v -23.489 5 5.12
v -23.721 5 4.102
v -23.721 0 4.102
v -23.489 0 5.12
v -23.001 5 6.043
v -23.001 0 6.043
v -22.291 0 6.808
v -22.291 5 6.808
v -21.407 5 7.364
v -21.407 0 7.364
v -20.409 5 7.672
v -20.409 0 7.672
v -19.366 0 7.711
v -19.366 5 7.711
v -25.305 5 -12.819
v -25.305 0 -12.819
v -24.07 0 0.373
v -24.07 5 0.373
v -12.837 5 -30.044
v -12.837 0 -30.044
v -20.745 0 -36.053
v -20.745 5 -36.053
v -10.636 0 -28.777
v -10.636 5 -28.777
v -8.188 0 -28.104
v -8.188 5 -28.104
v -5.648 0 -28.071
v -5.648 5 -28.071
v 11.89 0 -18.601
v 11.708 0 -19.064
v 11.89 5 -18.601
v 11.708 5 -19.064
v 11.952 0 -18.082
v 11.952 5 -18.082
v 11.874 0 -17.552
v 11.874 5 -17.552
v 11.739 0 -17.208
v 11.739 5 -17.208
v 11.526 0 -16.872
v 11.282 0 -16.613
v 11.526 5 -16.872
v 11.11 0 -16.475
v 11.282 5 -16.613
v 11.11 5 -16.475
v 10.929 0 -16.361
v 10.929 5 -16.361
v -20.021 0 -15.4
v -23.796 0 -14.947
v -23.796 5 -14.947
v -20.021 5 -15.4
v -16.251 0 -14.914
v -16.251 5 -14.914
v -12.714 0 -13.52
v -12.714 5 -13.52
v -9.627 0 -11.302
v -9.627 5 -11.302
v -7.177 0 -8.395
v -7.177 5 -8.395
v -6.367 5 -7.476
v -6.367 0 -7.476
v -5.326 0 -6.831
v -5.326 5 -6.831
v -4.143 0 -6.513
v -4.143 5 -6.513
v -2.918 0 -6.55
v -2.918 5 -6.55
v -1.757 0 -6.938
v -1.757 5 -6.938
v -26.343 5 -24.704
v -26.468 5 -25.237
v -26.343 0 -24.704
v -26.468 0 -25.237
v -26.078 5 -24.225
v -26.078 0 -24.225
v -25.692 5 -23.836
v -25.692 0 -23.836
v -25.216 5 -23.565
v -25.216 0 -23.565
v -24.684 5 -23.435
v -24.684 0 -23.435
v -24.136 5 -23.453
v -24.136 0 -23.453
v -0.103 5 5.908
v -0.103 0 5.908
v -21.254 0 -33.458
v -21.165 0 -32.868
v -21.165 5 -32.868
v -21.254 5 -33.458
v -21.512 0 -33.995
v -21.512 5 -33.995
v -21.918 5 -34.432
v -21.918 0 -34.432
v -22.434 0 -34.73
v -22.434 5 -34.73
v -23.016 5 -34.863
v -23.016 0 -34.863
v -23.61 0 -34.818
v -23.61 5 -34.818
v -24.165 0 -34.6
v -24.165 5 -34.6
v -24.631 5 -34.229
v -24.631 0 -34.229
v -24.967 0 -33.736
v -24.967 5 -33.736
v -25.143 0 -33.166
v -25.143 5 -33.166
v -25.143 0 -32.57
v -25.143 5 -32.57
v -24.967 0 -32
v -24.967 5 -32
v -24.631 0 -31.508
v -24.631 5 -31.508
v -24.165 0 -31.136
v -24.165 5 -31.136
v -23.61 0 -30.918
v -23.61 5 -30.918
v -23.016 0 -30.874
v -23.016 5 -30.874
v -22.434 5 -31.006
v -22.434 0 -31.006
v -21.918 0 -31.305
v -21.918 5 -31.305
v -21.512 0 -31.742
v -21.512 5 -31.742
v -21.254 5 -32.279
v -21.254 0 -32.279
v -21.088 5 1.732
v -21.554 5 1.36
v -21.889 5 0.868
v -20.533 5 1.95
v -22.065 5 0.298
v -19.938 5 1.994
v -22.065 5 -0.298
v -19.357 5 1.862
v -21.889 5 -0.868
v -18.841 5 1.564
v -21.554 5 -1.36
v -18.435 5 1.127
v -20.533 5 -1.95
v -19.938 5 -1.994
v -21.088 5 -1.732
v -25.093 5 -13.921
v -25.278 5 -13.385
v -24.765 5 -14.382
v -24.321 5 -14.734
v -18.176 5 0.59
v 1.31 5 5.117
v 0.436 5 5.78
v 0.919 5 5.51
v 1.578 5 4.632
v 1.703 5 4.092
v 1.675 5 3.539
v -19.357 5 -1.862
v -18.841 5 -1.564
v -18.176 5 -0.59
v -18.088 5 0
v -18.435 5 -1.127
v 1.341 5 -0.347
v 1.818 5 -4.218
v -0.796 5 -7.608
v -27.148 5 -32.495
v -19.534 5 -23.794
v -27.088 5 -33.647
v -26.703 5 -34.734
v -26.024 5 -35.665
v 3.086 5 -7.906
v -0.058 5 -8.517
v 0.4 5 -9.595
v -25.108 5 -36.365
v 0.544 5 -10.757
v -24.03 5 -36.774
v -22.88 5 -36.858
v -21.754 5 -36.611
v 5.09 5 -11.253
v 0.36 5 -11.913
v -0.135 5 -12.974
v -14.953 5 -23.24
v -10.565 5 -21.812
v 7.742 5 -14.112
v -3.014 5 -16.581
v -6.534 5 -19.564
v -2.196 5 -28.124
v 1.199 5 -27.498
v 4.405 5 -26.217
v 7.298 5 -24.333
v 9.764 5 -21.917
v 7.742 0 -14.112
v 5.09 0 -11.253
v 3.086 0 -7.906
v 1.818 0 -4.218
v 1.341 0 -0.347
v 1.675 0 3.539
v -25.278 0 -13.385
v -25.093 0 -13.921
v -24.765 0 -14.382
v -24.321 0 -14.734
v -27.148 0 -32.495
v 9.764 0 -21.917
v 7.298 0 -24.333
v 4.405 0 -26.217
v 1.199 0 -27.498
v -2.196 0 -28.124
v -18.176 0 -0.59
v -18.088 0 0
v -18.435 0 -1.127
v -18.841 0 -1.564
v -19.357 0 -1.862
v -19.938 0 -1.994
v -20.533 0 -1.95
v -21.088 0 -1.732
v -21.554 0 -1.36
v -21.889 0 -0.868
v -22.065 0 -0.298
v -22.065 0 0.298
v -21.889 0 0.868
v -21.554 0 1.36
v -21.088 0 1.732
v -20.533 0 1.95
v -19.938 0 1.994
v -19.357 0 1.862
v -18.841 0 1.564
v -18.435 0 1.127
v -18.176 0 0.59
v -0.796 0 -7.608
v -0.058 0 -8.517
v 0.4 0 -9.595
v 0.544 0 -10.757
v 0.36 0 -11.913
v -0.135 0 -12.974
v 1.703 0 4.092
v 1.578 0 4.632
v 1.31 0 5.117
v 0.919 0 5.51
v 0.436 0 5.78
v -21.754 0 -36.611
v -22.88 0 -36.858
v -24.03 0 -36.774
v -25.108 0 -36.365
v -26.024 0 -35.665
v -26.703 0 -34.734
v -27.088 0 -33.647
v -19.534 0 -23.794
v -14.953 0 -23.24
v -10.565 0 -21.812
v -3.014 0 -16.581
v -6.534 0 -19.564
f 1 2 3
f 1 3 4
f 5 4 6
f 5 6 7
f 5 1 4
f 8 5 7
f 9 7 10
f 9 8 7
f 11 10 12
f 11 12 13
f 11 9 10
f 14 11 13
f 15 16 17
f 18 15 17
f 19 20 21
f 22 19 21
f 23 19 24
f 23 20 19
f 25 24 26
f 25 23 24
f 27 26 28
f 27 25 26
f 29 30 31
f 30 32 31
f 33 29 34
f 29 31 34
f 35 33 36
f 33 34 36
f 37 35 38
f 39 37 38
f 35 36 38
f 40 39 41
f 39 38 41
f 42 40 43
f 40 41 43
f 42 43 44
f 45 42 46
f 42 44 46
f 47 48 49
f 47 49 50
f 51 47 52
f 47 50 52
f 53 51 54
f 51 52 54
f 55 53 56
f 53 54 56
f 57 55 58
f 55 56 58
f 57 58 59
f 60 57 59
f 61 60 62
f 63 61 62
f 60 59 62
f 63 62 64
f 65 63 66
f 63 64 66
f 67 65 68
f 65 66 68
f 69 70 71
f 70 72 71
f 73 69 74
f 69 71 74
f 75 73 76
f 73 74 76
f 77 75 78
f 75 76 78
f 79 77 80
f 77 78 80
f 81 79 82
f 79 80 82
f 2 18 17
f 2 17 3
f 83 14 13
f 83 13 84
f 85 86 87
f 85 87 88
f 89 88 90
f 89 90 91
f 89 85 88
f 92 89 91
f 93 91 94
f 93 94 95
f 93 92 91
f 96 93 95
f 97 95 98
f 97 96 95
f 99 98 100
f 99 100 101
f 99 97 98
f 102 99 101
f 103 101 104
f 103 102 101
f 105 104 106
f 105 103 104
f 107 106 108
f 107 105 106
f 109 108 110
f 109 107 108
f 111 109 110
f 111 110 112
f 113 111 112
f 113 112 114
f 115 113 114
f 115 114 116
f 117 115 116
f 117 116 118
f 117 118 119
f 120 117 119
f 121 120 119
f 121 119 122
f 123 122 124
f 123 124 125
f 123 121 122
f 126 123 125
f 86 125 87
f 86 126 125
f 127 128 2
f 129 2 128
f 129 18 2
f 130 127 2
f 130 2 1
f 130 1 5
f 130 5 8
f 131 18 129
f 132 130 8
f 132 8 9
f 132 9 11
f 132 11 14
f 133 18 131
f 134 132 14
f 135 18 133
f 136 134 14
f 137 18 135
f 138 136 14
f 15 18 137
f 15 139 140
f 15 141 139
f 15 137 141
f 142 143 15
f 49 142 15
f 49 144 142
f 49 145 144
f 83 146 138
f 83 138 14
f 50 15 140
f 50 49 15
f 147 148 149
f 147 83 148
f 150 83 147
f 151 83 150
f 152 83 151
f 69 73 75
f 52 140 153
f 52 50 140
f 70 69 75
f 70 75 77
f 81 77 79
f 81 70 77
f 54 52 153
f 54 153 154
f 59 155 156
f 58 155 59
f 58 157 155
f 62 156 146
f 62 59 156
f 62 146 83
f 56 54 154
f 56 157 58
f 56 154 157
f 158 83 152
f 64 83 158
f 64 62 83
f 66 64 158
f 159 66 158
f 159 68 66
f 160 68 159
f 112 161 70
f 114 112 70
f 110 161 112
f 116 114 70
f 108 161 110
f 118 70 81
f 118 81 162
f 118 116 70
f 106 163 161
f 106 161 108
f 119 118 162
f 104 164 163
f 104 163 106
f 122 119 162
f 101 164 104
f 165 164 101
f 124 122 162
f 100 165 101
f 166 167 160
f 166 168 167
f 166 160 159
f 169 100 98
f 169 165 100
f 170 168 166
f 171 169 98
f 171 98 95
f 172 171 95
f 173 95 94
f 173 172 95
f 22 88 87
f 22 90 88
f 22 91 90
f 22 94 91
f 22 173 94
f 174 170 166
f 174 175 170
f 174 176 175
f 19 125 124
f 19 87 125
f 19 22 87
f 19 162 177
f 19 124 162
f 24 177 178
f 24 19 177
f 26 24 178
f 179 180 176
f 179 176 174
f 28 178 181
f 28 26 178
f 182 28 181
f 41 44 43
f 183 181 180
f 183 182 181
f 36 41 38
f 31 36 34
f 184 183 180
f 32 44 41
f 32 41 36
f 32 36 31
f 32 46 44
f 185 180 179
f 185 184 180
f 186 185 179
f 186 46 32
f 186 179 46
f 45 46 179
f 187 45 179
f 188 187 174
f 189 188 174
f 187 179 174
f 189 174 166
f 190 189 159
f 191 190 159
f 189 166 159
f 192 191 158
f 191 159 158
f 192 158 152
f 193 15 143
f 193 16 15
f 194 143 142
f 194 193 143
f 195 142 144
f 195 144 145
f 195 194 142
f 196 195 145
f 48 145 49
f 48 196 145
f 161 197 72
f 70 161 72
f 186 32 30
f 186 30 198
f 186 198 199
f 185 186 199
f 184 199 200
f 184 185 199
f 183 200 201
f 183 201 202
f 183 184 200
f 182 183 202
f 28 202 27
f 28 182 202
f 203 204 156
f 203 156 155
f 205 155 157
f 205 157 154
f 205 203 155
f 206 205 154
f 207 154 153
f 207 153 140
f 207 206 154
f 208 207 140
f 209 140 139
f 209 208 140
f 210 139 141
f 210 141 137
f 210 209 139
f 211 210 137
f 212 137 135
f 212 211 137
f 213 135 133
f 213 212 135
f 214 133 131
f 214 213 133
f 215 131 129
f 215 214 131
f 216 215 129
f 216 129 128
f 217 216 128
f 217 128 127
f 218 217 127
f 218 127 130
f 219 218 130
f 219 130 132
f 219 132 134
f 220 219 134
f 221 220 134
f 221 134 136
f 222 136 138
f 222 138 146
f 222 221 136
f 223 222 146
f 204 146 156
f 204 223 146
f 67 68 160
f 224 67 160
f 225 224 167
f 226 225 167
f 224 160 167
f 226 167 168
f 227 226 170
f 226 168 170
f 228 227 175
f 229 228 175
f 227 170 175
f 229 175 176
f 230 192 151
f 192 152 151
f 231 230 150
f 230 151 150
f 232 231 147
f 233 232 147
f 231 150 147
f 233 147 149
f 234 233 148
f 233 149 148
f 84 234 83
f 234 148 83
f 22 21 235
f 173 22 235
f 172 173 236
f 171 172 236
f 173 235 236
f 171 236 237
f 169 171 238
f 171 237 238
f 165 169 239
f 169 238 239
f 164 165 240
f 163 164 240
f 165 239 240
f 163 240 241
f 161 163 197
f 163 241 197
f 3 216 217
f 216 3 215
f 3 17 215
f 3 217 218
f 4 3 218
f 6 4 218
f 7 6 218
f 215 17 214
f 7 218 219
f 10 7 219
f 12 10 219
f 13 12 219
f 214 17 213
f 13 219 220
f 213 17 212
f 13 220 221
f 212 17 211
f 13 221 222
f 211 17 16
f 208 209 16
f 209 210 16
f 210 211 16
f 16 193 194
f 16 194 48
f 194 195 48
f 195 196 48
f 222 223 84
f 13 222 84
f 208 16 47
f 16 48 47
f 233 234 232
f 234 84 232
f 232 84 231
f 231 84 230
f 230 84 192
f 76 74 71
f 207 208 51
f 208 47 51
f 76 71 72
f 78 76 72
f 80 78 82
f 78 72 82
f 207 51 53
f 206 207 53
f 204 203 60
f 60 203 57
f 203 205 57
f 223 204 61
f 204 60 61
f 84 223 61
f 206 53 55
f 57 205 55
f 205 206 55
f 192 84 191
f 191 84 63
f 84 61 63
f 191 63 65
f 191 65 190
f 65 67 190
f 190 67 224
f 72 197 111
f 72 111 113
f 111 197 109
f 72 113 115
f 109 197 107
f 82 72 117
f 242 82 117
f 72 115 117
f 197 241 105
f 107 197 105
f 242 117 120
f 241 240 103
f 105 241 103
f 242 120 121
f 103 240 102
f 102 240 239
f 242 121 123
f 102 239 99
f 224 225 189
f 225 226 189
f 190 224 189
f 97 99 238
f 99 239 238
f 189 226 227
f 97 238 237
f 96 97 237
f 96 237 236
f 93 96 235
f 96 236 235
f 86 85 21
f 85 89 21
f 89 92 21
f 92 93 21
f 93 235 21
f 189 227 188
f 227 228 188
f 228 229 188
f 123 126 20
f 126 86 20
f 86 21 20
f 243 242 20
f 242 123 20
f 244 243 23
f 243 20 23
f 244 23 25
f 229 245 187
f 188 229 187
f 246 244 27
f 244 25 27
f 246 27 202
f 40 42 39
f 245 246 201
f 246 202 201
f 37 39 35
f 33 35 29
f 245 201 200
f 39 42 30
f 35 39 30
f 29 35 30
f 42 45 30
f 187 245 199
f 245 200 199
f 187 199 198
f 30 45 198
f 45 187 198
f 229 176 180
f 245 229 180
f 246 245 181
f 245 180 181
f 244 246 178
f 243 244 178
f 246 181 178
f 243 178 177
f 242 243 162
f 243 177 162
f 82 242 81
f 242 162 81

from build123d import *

# Parameters (mm, degrees)
SKETCH_1_R          = 2
EXTRUDE_1_DEPTH     = 5
EXTRUDE_2_DEPTH     = 5
CUT_EXTRUDE_1_DEPTH = 6
EXTRUDE_3_DEPTH     = 5
FILLET_1_R          = 10
FILLET_2_R          = 2
SKETCH_6_R          = 18.75
CUT_EXTRUDE_2_DEPTH = 6
FILLET_3_R          = 2


with BuildPart() as part:
    # 草图1 → 凸台-拉伸1 (new body)
    with BuildSketch(Plane(origin=(0, 0, 0), x_dir=(1, 0, 0), z_dir=(0, 1, 0))):
        with BuildLine():
            ThreePointArc((-20.0875, 4), (-23.044826598, 2.693365811), (-24.070081176, -0.372890305))
            ThreePointArc((-24.070081176, -0.372890305), (-22.780865811, -2.957326598), (-20.0875, -4))
            ThreePointArc((-20.0875, -4), (-17.130173402, -2.693365811), (-16.104918824, 0.372890305))
            Line((-16.104918824, 0.372890305), (-16.444526225, 4))
            Line((-16.444526225, 4), (-20.0875, 4))
        make_face()
        with Locations((-20.0875, 0)):
            Circle(SKETCH_1_R, mode=Mode.SUBTRACT)
        with BuildLine():
            Line((-27.14754486, 32.495352138), (-24.070081176, -0.372890305))
            ThreePointArc((-24.070081176, -0.372890305), (-23.044826598, 2.693365811), (-20.0875, 4))
            Line((-20.0875, 4), (-16.444526225, 4))
            Line((-16.444526225, 4), (-18.333300994, 24.172685504))
            Line((-18.333300994, 24.172685504), (-25.585127327, 29.683464909))
            ThreePointArc((-25.585127327, 29.683464909), (-26.661456606, 30.925425609), (-27.14754486, 32.495352138))
        make_face()
        with BuildLine():
            ThreePointArc((-20.74480004, 36.053019976), (-25.107780517, 36.364735365), (-27.14754486, 32.495352138))
            ThreePointArc((-27.14754486, 32.495352138), (-26.661456606, 30.925425609), (-25.585127327, 29.683464909))
            Line((-25.585127327, 29.683464909), (-18.333300994, 24.172685504))
            Line((-18.333300994, 24.172685504), (-19.182382508, 33.241132747))
            ThreePointArc((-19.182382508, 33.241132747), (-19.668470762, 34.811059276), (-20.74480004, 36.053019976))
        make_face()
        with Locations((-23.164963684, 32.868242443)):
            Circle(SKETCH_1_R, mode=Mode.SUBTRACT)
        with BuildLine():
            Line((22.507663644, 3.184777534), (-20.74480004, 36.053019976))
            ThreePointArc((-20.74480004, 36.053019976), (-19.668470762, 34.811059276), (-19.182382508, 33.241132747))
            Line((-19.182382508, 33.241132747), (-18.333300994, 24.172685504))
            Line((-18.333300994, 24.172685504), (8.212637649, 4))
            Line((8.212637649, 4), (20.0875, 4))
            ThreePointArc((20.0875, 4), (21.364388771, 3.790719598), (22.507663644, 3.184777534))
        make_face()
        with BuildLine():
            ThreePointArc((-16.104918824, 0.372890305), (-17.130173402, -2.693365811), (-20.0875, -4))
            Line((-20.0875, -4), (20.0875, -4))
            ThreePointArc((20.0875, -4), (18.810611229, -3.790719598), (17.667336356, -3.184777534))
            Line((17.667336356, -3.184777534), (8.212637649, 4))
            Line((8.212637649, 4), (-16.444526225, 4))
            Line((-16.444526225, 4), (-16.104918824, 0.372890305))
        make_face()
        with BuildLine():
            ThreePointArc((17.667336356, -3.184777534), (18.810611229, -3.790719598), (20.0875, -4))
            ThreePointArc((20.0875, -4), (23.878219598, -1.276888771), (22.507663644, 3.184777534))
            ThreePointArc((22.507663644, 3.184777534), (21.364388771, 3.790719598), (20.0875, 4))
            Line((20.0875, 4), (8.212637649, 4))
            Line((8.212637649, 4), (17.667336356, -3.184777534))
        make_face()
        with Locations((20.0875, 0)):
            Circle(SKETCH_1_R, mode=Mode.SUBTRACT)
        Polygon((-18.333300994, 24.172685504), (-16.444526225, 4), (8.212637649, 4), align=None)
    extrude(amount=EXTRUDE_1_DEPTH)

    # 草图2 → 凸台-拉伸2 (add)
    with BuildSketch(Plane(origin=(0, 5, 0), x_dir=(1, 0, 0), z_dir=(0, 1, 0))):
        with BuildLine():
            ThreePointArc((-20.0875, -4), (-22.780865811, -2.957326598), (-24.070081176, -0.372890305))
            Line((-24.070081176, -0.372890305), (-23.720962628, -4.10158193))
            ThreePointArc((-23.720962628, -4.10158193), (-22.290826699, -6.808468121), (-19.365512753, -7.711274824))
            Line((-19.365512753, -7.711274824), (20.460368699, -3.982583199))
            ThreePointArc((20.460368699, -3.982583199), (20.274137625, -3.995643427), (20.0875, -4))
            Line((20.0875, -4), (-20.0875, -4))
        make_face()
    extrude(amount=-EXTRUDE_2_DEPTH)

    # 草图3 → 切除-拉伸1 (cut, through all)
    with BuildSketch(Plane(origin=(0, 5, 0), x_dir=(1, 0, 0), z_dir=(0, 1, 0))):
        with BuildLine():
            ThreePointArc((-36.289327432, 17.433897667), (-37.629570165, 14.285674695), (-36.182704661, 11.185007239))
            ThreePointArc((-36.182704661, 11.185007239), (-31.653466249, 15.823666602), (-25.858788976, 18.731049718))
            Line((-25.858788976, 18.731049718), (-26.257218708, 22.986399698))
            ThreePointArc((-26.257218708, 22.986399698), (-31.612650276, 20.82332613), (-36.289327432, 17.433897667))
        make_face()
        with BuildLine():
            ThreePointArc((-25.858788976, 18.731049718), (-11.47348363, 17.605644606), (-1.756724615, 6.938492183))
            ThreePointArc((-1.756724615, 6.938492183), (0.40025314, 9.594618202), (-0.134776474, 12.974159854))
            ThreePointArc((-0.134776474, 12.974159854), (-11.569633945, 22.223545124), (-26.257218708, 22.986399698))
            Line((-26.257218708, 22.986399698), (-25.858788976, 18.731049718))
        make_face()
        with BuildLine():
            ThreePointArc((-7.176914189, 8.395044611), (-4.745829362, 6.62850376), (-1.756724615, 6.938492183))
            ThreePointArc((-1.756724615, 6.938492183), (-11.47348363, 17.605644606), (-25.858788976, 18.731049718))
            Line((-25.858788976, 18.731049718), (-25.456435977, 14.433798061))
            ThreePointArc((-25.456435977, 14.433798061), (-15.256790284, 14.622730376), (-7.176914189, 8.395044611))
        make_face()
        with BuildLine():
            ThreePointArc((-25.858788976, 18.731049718), (-31.653466249, 15.823666602), (-36.182704661, 11.185007239))
            ThreePointArc((-36.182704661, 11.185007239), (-33.358528619, 10.15793874), (-30.571035397, 11.280757314))
            ThreePointArc((-30.571035397, 11.280757314), (-28.168999159, 13.109133127), (-25.456435977, 14.433798061))
            Line((-25.456435977, 14.433798061), (-25.858788976, 18.731049718))
        make_face()
    extrude(amount=-CUT_EXTRUDE_1_DEPTH, mode=Mode.SUBTRACT)

    # 草图4 → 凸台-拉伸3 (add)
    with BuildSketch(Plane(origin=(0, 5, 0), x_dir=(1, 0, 0), z_dir=(0, 1, 0))):
        with BuildLine():
            ThreePointArc((13.821061528, 9.785866119), (13.838380431, 10.235085855), (13.844154668, 10.684602232))
            ThreePointArc((13.844154668, 10.684602232), (6.570974544, 24.885382325), (-9.202948787, 27.282181672))
            Line((-9.202948787, 27.282181672), (13.821061528, 9.785866119))
        make_face()
    extrude(amount=-EXTRUDE_3_DEPTH)

    # 圆角1
    fillet_1_edges = [part.edges().sort_by_distance(p)[0] for p in [
        (13.821061528, 2.5, -9.785866119),
        (-9.202948787, 2.5, -27.282181672),
    ]]
    fillet(fillet_1_edges, radius=FILLET_1_R)

    # 圆角2
    fillet_2_edges = [part.edges().sort_by_distance(p)[0] for p in [
        (-26.257218708, 2.5, -22.986399698),
        (-25.456435977, 2.5, -14.433798061),
    ]]
    fillet(fillet_2_edges, radius=FILLET_2_R)

    # 草图6 → 切除-拉伸2 (cut, through all)
    with BuildSketch(Plane(origin=(0, 5, 0), x_dir=(1, 0, 0), z_dir=(0, 1, 0))):
        with Locations((20.0875, 0)):
            Circle(SKETCH_6_R)
    extrude(amount=-CUT_EXTRUDE_2_DEPTH, mode=Mode.SUBTRACT)

    # 圆角3
    fillet_3_edges = [part.edges().sort_by_distance(p)[0] for p in [
        (12.591508983, 2.5, -17.186407963),
        (2.22176543, 2.5, 5.690169441),
    ]]
    fillet(fillet_3_edges, radius=FILLET_3_R)


solid = part.part
